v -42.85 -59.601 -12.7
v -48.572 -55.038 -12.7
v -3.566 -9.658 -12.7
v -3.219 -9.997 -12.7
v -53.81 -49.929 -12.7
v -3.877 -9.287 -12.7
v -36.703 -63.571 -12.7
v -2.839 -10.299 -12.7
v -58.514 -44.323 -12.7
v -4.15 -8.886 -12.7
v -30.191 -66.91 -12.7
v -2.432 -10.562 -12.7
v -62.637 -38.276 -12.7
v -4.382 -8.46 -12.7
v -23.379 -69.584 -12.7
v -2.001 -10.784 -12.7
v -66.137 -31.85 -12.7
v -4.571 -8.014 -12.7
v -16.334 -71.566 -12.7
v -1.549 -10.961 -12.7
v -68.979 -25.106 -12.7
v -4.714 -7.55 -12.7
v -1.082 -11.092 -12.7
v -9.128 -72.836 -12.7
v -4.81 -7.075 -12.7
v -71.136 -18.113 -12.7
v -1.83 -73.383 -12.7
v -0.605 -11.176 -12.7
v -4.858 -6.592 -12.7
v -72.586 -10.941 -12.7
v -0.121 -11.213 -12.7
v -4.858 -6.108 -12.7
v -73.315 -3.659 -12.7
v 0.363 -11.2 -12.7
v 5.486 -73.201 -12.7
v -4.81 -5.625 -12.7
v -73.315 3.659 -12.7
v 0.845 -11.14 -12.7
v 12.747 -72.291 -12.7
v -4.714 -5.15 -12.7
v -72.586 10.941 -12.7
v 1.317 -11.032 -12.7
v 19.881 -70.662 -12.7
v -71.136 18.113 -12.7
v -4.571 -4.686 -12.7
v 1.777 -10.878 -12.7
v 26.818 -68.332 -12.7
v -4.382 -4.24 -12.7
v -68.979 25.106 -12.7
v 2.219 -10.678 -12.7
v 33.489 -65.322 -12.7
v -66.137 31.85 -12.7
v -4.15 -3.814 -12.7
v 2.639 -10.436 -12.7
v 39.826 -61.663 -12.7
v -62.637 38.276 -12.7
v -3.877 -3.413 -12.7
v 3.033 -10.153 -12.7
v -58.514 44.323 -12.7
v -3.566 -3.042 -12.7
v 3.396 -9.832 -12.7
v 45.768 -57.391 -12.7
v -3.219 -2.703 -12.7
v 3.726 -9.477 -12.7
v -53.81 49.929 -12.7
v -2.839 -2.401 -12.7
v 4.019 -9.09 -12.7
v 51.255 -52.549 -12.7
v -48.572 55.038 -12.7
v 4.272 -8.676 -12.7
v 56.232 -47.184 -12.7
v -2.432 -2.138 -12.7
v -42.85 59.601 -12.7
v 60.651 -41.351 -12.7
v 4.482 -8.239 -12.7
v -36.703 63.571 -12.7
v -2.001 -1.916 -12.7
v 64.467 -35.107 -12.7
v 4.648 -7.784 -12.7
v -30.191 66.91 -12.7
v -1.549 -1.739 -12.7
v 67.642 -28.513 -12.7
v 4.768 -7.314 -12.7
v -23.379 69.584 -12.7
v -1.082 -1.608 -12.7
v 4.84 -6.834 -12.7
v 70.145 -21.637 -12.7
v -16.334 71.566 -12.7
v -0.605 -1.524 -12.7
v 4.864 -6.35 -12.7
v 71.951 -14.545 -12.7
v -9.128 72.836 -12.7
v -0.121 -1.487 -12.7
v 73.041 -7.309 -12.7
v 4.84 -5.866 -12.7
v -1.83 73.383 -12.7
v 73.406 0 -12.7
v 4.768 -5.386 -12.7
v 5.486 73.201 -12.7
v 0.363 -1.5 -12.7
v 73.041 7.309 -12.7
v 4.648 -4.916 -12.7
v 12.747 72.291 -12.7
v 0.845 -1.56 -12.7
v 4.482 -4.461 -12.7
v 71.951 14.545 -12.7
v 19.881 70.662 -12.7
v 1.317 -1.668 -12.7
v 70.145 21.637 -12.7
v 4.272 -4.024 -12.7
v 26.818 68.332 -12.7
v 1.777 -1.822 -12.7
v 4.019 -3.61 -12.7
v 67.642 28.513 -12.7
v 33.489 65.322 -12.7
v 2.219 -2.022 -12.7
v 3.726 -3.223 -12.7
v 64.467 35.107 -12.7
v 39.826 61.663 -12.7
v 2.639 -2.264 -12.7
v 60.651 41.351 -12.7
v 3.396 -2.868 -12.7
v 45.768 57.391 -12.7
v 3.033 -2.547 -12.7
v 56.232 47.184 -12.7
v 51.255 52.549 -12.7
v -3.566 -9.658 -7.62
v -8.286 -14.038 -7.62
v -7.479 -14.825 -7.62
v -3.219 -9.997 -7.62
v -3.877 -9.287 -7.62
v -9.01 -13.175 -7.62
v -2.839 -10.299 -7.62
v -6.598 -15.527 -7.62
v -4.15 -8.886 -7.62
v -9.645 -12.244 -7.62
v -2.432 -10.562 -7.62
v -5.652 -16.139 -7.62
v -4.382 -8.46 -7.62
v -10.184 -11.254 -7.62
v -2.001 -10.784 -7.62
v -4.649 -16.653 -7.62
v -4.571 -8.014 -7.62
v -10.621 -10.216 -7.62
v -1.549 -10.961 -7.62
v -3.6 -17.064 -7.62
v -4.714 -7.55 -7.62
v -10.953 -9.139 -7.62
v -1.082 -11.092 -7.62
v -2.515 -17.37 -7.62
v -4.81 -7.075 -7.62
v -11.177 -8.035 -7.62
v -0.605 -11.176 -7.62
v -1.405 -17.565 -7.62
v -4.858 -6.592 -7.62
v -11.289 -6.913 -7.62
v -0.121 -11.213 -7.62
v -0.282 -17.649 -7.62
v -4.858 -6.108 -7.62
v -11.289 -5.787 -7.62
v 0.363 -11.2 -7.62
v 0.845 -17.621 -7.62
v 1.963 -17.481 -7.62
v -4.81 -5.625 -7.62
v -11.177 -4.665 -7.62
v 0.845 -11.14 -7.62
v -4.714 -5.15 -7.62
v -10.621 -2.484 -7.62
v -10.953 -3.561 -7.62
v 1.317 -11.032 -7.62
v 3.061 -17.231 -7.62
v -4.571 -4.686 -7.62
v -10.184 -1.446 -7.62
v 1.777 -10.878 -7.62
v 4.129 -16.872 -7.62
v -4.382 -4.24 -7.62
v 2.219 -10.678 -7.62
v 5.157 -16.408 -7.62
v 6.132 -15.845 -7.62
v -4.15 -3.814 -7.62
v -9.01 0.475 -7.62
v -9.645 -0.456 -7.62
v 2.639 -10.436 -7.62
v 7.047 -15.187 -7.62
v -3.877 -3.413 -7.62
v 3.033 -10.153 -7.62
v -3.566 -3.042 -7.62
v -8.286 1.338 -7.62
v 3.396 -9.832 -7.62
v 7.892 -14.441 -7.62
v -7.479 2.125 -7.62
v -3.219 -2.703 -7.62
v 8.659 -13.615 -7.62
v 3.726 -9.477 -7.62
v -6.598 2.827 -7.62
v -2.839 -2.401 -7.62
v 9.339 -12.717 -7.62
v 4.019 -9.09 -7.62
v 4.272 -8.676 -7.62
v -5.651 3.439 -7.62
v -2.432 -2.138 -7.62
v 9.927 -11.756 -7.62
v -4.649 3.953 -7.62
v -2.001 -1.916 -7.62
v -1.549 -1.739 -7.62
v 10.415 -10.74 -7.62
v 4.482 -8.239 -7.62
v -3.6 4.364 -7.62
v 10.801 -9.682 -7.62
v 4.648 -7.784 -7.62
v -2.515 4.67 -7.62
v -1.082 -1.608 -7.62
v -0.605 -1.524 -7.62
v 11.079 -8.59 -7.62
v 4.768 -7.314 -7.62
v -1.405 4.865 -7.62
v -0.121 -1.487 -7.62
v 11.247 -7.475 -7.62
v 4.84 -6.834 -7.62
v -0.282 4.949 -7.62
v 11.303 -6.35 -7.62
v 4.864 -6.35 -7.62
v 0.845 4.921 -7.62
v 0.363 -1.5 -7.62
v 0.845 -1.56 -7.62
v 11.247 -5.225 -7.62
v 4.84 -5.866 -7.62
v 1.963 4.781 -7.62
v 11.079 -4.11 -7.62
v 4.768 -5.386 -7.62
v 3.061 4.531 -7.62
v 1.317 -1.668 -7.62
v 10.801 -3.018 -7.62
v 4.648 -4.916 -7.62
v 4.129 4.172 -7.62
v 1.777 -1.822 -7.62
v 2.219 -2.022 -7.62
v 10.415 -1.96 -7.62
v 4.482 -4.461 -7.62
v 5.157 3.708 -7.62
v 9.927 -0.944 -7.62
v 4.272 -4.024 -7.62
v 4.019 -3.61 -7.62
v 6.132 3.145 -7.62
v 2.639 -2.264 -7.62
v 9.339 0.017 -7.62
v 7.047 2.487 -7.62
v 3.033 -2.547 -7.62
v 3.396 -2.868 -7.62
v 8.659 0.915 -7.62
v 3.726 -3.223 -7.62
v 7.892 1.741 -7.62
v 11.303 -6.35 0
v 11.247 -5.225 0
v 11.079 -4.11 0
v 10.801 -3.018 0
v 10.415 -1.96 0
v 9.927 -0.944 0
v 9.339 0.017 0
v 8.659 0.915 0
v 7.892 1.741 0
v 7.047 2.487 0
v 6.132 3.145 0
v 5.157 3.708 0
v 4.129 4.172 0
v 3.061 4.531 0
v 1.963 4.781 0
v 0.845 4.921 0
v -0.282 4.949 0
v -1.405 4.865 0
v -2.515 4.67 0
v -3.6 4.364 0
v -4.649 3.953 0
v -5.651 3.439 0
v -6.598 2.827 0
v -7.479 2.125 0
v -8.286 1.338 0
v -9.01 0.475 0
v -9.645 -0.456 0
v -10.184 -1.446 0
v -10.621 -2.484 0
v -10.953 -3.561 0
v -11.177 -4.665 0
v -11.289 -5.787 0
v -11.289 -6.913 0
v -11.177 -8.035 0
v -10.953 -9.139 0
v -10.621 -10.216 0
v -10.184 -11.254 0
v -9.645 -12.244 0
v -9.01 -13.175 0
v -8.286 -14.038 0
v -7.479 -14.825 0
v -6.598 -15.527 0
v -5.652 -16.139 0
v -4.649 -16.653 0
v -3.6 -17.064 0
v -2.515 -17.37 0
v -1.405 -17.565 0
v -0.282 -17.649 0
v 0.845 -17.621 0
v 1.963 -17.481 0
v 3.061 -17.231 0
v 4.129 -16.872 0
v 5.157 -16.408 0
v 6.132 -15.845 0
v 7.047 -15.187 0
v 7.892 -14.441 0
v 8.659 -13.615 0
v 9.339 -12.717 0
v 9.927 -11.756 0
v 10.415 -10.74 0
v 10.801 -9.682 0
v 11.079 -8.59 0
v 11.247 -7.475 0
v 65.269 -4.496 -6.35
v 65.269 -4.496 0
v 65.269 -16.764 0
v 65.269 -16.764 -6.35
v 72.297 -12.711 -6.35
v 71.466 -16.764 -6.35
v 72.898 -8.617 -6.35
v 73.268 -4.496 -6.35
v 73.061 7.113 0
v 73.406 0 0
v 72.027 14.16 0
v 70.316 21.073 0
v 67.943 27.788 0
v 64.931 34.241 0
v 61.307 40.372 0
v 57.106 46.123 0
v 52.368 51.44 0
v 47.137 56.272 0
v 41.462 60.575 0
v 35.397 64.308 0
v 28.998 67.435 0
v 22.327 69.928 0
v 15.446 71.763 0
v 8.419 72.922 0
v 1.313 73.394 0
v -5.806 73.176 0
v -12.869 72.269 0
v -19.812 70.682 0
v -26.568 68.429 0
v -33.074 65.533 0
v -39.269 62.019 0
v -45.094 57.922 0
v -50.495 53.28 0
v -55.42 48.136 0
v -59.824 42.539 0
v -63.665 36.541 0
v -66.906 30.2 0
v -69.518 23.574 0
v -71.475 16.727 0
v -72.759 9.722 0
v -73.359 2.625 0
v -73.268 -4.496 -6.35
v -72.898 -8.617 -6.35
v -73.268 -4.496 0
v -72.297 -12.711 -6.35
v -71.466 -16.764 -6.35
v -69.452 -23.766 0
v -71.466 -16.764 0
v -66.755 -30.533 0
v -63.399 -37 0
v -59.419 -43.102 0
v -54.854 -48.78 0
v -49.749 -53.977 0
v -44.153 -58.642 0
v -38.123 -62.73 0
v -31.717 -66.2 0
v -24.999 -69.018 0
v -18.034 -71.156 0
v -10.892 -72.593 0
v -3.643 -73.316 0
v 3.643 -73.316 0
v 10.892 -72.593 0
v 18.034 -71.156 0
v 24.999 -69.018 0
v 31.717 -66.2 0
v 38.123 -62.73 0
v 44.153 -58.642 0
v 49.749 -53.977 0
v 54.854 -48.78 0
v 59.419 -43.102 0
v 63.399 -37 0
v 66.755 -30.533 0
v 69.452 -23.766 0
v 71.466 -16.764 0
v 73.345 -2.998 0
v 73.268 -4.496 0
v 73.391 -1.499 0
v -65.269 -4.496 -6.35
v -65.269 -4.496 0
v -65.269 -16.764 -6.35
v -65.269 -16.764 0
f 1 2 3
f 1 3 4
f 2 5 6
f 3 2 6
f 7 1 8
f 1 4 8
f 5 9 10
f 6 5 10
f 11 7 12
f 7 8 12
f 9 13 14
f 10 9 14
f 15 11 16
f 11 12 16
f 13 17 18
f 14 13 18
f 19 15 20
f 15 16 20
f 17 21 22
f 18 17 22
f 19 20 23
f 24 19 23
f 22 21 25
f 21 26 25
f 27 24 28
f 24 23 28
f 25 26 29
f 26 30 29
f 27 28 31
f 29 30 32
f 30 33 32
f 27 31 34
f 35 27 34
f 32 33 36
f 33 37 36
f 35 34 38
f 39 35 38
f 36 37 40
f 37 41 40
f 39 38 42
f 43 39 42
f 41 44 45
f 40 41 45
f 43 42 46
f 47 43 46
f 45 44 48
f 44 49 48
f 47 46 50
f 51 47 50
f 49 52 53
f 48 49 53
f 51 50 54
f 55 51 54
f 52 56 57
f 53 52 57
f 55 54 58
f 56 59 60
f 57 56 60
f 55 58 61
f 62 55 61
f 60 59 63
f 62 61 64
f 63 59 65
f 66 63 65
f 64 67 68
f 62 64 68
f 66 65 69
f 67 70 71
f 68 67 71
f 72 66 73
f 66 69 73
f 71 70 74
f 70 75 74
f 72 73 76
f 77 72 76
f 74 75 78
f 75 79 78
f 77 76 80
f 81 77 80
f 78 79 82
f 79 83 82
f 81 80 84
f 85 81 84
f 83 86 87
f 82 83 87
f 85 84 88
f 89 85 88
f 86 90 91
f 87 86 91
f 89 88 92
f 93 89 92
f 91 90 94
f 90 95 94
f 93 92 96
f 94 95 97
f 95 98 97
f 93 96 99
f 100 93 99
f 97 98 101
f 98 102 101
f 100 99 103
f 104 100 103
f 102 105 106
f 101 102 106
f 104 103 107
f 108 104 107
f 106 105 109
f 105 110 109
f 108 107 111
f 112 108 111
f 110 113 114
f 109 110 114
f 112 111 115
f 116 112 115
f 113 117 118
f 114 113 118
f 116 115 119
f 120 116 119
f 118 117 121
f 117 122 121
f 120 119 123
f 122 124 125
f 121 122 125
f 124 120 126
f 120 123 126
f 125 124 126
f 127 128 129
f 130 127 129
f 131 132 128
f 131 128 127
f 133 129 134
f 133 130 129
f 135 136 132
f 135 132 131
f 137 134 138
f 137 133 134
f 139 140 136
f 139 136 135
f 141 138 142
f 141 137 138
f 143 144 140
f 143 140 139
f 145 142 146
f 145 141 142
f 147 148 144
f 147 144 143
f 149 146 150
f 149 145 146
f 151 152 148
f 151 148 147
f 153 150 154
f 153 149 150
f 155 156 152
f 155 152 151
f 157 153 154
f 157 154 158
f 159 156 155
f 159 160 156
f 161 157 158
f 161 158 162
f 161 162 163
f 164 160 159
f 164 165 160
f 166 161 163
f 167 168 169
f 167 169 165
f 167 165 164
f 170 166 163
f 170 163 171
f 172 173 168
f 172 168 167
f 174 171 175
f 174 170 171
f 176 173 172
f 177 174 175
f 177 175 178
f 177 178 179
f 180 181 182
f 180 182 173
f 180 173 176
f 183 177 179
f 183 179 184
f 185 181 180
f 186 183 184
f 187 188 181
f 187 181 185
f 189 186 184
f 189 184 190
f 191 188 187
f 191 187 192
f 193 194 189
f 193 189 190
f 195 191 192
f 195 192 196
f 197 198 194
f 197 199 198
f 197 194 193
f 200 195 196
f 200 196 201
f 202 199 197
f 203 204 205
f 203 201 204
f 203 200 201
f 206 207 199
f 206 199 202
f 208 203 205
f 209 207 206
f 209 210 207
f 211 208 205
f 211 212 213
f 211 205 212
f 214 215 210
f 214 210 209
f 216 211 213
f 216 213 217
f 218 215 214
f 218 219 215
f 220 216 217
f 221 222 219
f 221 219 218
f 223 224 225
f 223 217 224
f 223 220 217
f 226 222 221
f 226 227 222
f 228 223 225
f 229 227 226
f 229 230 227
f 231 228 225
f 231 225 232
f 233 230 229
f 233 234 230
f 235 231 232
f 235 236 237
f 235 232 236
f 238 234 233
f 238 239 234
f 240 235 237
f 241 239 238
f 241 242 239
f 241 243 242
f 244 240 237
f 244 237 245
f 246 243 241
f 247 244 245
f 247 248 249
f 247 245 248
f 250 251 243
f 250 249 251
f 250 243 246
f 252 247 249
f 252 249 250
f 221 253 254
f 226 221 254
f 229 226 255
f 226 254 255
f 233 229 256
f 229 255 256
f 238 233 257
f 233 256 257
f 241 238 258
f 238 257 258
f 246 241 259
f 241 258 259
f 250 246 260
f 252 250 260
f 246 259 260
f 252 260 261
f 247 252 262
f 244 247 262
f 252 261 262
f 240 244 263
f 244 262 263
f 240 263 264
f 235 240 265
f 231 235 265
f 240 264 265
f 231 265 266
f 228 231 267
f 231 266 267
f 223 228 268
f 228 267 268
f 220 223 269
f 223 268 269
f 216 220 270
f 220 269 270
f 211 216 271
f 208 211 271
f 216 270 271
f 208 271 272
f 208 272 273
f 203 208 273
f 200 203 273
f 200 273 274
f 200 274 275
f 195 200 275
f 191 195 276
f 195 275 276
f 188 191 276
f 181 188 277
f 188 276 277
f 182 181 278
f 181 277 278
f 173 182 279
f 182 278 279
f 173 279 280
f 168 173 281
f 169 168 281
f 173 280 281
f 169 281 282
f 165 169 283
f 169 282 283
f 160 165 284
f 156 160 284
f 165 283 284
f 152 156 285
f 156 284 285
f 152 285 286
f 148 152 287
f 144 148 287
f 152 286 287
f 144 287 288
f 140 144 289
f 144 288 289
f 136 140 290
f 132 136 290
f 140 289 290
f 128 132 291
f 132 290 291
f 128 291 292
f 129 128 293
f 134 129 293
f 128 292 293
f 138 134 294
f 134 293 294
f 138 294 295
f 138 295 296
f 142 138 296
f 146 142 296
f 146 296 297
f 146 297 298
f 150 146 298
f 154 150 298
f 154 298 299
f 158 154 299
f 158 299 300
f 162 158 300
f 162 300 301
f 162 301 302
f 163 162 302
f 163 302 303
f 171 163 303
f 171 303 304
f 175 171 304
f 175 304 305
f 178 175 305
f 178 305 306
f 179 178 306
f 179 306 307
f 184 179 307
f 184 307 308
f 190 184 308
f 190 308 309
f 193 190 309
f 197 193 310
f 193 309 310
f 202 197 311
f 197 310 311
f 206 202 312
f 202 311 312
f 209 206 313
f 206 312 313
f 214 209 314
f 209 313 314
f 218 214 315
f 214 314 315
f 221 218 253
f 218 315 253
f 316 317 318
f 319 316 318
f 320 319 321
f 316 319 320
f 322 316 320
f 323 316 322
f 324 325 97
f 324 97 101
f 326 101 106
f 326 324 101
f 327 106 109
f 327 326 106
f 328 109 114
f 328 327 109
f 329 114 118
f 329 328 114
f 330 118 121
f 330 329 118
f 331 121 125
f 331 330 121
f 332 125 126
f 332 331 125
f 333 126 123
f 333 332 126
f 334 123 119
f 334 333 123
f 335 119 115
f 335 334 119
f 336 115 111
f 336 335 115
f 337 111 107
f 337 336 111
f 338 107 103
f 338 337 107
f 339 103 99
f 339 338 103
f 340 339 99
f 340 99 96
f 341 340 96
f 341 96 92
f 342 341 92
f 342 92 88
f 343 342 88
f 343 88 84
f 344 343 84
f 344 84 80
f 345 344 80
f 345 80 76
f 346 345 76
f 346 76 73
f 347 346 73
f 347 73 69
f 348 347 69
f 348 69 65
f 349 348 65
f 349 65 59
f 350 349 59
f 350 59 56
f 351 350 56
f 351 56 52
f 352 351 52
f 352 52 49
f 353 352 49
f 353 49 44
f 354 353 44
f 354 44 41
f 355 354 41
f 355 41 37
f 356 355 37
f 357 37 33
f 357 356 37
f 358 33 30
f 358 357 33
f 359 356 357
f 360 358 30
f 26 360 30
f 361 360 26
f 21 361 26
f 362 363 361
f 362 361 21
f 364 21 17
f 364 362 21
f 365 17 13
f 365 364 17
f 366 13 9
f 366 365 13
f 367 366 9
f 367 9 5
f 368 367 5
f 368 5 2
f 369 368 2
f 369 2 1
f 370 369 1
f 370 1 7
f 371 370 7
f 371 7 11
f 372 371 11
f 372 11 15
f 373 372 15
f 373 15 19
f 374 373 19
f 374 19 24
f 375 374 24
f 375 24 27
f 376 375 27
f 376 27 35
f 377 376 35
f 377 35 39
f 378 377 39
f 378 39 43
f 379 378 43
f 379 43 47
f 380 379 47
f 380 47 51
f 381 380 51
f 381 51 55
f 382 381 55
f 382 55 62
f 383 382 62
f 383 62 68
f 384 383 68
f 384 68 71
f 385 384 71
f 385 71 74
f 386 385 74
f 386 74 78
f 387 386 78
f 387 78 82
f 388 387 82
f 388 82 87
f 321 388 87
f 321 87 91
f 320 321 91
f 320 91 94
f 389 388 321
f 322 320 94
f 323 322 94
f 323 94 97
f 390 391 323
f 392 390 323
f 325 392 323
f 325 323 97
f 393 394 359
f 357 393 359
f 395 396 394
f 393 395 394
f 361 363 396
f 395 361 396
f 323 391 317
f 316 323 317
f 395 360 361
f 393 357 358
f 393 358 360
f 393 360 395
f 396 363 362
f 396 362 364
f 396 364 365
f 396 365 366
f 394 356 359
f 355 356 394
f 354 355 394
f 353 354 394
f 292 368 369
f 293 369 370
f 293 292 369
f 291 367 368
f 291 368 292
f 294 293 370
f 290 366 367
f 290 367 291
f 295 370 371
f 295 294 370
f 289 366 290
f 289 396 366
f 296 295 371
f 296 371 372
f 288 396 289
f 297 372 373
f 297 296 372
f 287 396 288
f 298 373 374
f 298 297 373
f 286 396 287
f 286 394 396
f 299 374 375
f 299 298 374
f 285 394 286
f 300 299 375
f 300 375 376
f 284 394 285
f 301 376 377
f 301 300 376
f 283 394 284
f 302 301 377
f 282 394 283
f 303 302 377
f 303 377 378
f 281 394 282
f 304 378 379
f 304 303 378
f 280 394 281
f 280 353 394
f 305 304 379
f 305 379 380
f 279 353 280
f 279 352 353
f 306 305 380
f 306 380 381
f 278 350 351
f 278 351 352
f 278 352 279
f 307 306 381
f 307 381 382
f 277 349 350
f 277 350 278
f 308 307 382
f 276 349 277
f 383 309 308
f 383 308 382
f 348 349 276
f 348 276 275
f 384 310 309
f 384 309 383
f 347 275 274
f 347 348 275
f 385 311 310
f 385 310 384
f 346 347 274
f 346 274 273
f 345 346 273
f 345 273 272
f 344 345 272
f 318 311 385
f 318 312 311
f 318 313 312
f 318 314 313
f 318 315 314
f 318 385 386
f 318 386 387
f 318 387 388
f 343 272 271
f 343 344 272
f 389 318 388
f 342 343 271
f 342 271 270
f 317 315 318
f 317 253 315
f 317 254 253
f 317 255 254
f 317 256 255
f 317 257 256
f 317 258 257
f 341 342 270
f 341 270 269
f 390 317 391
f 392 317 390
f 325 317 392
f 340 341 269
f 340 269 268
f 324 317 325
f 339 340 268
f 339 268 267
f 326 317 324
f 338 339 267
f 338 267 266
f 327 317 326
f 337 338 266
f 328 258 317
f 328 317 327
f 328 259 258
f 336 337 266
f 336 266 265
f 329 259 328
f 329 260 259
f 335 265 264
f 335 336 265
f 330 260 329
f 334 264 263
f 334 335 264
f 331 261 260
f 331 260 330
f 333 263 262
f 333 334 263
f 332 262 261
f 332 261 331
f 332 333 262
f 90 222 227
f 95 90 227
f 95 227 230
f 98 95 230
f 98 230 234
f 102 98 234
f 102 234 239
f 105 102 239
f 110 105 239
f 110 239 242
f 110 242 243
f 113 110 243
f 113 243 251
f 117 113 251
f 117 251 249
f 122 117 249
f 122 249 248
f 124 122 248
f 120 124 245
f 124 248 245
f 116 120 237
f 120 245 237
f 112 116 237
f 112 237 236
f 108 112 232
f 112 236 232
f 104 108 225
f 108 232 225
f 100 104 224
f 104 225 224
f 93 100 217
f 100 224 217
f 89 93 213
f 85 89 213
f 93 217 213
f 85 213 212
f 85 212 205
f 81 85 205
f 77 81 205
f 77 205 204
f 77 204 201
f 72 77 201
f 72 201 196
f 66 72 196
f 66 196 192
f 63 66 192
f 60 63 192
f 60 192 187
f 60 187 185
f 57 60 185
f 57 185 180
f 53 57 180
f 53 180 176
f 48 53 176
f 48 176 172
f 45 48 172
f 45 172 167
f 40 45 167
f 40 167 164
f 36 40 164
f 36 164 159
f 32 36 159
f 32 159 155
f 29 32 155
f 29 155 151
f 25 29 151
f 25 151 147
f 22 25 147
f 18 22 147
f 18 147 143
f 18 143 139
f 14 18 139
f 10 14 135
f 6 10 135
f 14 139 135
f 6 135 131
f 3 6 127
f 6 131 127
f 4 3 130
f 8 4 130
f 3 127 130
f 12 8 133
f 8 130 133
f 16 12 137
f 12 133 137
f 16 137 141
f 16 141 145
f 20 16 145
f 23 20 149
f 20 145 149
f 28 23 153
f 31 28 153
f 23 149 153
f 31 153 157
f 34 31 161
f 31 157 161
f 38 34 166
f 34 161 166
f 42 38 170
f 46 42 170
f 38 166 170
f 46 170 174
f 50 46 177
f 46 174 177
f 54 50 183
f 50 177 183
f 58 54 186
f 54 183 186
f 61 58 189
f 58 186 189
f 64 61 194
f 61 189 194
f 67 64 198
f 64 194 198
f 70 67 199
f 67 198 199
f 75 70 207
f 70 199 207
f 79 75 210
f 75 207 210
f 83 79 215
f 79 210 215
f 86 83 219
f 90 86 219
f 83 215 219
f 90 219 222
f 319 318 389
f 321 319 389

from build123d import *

# Parameters (mm, degrees)
SKETCH1_R           = 73.406
BOSS_EXTRUDE1_DEPTH = 12.7
CUT_EXTRUDE1_DEPTH  = 6.35
SKETCH3_R           = 11.303
CUT_EXTRUDE2_DEPTH  = 7.62
SKETCH4_R           = 4.8641
CUT_EXTRUDE3_DEPTH  = 105.585714474


with BuildPart() as part:
    # Sketch1 → Boss-Extrude1 (new body)
    with BuildSketch(Plane.XY):
        Circle(SKETCH1_R)
    extrude(amount=-BOSS_EXTRUDE1_DEPTH)

    # Sketch2 → Cut-Extrude1 (cut)
    with BuildSketch(Plane.XY):
        Polygon((-71.466139815, -4.4958), (-71.466139815, -16.764), (-65.268539815, -16.764), (-65.268539815, -4.4958), (-67.31, -4.4958), align=None)
        with BuildLine():
            ThreePointArc((-73.2681965, -4.4958), (-72.626676985, -10.668018845), (-71.466139815, -16.764))
            Line((-71.466139815, -16.764), (-71.466139815, -4.4958))
            Line((-71.466139815, -4.4958), (-73.2681965, -4.4958))
        make_face()
        Polygon((71.466139815, -16.764), (71.466139815, -4.4958), (67.31, -4.4958), (65.268539815, -4.4958), (65.268539815, -16.764), align=None)
        with BuildLine():
            Line((73.2681965, -4.4958), (71.466139815, -4.4958))
            Line((71.466139815, -4.4958), (71.466139815, -16.764))
            ThreePointArc((71.466139815, -16.764), (72.626676985, -10.668018845), (73.2681965, -4.4958))
        make_face()
    extrude(amount=-CUT_EXTRUDE1_DEPTH, mode=Mode.SUBTRACT)

    # Sketch3 → Cut-Extrude2 (cut)
    with BuildSketch(Plane.XY):
        with Locations((0, -6.35)):
            Circle(SKETCH3_R)
    extrude(amount=-CUT_EXTRUDE2_DEPTH, mode=Mode.SUBTRACT)

    # Sketch4 → Cut-Extrude3 (cut, through all)
    with BuildSketch(Plane.XY):
        with Locations((0, -6.35)):
            Circle(SKETCH4_R)
    extrude(amount=-CUT_EXTRUDE3_DEPTH, mode=Mode.SUBTRACT)


solid = part.part
